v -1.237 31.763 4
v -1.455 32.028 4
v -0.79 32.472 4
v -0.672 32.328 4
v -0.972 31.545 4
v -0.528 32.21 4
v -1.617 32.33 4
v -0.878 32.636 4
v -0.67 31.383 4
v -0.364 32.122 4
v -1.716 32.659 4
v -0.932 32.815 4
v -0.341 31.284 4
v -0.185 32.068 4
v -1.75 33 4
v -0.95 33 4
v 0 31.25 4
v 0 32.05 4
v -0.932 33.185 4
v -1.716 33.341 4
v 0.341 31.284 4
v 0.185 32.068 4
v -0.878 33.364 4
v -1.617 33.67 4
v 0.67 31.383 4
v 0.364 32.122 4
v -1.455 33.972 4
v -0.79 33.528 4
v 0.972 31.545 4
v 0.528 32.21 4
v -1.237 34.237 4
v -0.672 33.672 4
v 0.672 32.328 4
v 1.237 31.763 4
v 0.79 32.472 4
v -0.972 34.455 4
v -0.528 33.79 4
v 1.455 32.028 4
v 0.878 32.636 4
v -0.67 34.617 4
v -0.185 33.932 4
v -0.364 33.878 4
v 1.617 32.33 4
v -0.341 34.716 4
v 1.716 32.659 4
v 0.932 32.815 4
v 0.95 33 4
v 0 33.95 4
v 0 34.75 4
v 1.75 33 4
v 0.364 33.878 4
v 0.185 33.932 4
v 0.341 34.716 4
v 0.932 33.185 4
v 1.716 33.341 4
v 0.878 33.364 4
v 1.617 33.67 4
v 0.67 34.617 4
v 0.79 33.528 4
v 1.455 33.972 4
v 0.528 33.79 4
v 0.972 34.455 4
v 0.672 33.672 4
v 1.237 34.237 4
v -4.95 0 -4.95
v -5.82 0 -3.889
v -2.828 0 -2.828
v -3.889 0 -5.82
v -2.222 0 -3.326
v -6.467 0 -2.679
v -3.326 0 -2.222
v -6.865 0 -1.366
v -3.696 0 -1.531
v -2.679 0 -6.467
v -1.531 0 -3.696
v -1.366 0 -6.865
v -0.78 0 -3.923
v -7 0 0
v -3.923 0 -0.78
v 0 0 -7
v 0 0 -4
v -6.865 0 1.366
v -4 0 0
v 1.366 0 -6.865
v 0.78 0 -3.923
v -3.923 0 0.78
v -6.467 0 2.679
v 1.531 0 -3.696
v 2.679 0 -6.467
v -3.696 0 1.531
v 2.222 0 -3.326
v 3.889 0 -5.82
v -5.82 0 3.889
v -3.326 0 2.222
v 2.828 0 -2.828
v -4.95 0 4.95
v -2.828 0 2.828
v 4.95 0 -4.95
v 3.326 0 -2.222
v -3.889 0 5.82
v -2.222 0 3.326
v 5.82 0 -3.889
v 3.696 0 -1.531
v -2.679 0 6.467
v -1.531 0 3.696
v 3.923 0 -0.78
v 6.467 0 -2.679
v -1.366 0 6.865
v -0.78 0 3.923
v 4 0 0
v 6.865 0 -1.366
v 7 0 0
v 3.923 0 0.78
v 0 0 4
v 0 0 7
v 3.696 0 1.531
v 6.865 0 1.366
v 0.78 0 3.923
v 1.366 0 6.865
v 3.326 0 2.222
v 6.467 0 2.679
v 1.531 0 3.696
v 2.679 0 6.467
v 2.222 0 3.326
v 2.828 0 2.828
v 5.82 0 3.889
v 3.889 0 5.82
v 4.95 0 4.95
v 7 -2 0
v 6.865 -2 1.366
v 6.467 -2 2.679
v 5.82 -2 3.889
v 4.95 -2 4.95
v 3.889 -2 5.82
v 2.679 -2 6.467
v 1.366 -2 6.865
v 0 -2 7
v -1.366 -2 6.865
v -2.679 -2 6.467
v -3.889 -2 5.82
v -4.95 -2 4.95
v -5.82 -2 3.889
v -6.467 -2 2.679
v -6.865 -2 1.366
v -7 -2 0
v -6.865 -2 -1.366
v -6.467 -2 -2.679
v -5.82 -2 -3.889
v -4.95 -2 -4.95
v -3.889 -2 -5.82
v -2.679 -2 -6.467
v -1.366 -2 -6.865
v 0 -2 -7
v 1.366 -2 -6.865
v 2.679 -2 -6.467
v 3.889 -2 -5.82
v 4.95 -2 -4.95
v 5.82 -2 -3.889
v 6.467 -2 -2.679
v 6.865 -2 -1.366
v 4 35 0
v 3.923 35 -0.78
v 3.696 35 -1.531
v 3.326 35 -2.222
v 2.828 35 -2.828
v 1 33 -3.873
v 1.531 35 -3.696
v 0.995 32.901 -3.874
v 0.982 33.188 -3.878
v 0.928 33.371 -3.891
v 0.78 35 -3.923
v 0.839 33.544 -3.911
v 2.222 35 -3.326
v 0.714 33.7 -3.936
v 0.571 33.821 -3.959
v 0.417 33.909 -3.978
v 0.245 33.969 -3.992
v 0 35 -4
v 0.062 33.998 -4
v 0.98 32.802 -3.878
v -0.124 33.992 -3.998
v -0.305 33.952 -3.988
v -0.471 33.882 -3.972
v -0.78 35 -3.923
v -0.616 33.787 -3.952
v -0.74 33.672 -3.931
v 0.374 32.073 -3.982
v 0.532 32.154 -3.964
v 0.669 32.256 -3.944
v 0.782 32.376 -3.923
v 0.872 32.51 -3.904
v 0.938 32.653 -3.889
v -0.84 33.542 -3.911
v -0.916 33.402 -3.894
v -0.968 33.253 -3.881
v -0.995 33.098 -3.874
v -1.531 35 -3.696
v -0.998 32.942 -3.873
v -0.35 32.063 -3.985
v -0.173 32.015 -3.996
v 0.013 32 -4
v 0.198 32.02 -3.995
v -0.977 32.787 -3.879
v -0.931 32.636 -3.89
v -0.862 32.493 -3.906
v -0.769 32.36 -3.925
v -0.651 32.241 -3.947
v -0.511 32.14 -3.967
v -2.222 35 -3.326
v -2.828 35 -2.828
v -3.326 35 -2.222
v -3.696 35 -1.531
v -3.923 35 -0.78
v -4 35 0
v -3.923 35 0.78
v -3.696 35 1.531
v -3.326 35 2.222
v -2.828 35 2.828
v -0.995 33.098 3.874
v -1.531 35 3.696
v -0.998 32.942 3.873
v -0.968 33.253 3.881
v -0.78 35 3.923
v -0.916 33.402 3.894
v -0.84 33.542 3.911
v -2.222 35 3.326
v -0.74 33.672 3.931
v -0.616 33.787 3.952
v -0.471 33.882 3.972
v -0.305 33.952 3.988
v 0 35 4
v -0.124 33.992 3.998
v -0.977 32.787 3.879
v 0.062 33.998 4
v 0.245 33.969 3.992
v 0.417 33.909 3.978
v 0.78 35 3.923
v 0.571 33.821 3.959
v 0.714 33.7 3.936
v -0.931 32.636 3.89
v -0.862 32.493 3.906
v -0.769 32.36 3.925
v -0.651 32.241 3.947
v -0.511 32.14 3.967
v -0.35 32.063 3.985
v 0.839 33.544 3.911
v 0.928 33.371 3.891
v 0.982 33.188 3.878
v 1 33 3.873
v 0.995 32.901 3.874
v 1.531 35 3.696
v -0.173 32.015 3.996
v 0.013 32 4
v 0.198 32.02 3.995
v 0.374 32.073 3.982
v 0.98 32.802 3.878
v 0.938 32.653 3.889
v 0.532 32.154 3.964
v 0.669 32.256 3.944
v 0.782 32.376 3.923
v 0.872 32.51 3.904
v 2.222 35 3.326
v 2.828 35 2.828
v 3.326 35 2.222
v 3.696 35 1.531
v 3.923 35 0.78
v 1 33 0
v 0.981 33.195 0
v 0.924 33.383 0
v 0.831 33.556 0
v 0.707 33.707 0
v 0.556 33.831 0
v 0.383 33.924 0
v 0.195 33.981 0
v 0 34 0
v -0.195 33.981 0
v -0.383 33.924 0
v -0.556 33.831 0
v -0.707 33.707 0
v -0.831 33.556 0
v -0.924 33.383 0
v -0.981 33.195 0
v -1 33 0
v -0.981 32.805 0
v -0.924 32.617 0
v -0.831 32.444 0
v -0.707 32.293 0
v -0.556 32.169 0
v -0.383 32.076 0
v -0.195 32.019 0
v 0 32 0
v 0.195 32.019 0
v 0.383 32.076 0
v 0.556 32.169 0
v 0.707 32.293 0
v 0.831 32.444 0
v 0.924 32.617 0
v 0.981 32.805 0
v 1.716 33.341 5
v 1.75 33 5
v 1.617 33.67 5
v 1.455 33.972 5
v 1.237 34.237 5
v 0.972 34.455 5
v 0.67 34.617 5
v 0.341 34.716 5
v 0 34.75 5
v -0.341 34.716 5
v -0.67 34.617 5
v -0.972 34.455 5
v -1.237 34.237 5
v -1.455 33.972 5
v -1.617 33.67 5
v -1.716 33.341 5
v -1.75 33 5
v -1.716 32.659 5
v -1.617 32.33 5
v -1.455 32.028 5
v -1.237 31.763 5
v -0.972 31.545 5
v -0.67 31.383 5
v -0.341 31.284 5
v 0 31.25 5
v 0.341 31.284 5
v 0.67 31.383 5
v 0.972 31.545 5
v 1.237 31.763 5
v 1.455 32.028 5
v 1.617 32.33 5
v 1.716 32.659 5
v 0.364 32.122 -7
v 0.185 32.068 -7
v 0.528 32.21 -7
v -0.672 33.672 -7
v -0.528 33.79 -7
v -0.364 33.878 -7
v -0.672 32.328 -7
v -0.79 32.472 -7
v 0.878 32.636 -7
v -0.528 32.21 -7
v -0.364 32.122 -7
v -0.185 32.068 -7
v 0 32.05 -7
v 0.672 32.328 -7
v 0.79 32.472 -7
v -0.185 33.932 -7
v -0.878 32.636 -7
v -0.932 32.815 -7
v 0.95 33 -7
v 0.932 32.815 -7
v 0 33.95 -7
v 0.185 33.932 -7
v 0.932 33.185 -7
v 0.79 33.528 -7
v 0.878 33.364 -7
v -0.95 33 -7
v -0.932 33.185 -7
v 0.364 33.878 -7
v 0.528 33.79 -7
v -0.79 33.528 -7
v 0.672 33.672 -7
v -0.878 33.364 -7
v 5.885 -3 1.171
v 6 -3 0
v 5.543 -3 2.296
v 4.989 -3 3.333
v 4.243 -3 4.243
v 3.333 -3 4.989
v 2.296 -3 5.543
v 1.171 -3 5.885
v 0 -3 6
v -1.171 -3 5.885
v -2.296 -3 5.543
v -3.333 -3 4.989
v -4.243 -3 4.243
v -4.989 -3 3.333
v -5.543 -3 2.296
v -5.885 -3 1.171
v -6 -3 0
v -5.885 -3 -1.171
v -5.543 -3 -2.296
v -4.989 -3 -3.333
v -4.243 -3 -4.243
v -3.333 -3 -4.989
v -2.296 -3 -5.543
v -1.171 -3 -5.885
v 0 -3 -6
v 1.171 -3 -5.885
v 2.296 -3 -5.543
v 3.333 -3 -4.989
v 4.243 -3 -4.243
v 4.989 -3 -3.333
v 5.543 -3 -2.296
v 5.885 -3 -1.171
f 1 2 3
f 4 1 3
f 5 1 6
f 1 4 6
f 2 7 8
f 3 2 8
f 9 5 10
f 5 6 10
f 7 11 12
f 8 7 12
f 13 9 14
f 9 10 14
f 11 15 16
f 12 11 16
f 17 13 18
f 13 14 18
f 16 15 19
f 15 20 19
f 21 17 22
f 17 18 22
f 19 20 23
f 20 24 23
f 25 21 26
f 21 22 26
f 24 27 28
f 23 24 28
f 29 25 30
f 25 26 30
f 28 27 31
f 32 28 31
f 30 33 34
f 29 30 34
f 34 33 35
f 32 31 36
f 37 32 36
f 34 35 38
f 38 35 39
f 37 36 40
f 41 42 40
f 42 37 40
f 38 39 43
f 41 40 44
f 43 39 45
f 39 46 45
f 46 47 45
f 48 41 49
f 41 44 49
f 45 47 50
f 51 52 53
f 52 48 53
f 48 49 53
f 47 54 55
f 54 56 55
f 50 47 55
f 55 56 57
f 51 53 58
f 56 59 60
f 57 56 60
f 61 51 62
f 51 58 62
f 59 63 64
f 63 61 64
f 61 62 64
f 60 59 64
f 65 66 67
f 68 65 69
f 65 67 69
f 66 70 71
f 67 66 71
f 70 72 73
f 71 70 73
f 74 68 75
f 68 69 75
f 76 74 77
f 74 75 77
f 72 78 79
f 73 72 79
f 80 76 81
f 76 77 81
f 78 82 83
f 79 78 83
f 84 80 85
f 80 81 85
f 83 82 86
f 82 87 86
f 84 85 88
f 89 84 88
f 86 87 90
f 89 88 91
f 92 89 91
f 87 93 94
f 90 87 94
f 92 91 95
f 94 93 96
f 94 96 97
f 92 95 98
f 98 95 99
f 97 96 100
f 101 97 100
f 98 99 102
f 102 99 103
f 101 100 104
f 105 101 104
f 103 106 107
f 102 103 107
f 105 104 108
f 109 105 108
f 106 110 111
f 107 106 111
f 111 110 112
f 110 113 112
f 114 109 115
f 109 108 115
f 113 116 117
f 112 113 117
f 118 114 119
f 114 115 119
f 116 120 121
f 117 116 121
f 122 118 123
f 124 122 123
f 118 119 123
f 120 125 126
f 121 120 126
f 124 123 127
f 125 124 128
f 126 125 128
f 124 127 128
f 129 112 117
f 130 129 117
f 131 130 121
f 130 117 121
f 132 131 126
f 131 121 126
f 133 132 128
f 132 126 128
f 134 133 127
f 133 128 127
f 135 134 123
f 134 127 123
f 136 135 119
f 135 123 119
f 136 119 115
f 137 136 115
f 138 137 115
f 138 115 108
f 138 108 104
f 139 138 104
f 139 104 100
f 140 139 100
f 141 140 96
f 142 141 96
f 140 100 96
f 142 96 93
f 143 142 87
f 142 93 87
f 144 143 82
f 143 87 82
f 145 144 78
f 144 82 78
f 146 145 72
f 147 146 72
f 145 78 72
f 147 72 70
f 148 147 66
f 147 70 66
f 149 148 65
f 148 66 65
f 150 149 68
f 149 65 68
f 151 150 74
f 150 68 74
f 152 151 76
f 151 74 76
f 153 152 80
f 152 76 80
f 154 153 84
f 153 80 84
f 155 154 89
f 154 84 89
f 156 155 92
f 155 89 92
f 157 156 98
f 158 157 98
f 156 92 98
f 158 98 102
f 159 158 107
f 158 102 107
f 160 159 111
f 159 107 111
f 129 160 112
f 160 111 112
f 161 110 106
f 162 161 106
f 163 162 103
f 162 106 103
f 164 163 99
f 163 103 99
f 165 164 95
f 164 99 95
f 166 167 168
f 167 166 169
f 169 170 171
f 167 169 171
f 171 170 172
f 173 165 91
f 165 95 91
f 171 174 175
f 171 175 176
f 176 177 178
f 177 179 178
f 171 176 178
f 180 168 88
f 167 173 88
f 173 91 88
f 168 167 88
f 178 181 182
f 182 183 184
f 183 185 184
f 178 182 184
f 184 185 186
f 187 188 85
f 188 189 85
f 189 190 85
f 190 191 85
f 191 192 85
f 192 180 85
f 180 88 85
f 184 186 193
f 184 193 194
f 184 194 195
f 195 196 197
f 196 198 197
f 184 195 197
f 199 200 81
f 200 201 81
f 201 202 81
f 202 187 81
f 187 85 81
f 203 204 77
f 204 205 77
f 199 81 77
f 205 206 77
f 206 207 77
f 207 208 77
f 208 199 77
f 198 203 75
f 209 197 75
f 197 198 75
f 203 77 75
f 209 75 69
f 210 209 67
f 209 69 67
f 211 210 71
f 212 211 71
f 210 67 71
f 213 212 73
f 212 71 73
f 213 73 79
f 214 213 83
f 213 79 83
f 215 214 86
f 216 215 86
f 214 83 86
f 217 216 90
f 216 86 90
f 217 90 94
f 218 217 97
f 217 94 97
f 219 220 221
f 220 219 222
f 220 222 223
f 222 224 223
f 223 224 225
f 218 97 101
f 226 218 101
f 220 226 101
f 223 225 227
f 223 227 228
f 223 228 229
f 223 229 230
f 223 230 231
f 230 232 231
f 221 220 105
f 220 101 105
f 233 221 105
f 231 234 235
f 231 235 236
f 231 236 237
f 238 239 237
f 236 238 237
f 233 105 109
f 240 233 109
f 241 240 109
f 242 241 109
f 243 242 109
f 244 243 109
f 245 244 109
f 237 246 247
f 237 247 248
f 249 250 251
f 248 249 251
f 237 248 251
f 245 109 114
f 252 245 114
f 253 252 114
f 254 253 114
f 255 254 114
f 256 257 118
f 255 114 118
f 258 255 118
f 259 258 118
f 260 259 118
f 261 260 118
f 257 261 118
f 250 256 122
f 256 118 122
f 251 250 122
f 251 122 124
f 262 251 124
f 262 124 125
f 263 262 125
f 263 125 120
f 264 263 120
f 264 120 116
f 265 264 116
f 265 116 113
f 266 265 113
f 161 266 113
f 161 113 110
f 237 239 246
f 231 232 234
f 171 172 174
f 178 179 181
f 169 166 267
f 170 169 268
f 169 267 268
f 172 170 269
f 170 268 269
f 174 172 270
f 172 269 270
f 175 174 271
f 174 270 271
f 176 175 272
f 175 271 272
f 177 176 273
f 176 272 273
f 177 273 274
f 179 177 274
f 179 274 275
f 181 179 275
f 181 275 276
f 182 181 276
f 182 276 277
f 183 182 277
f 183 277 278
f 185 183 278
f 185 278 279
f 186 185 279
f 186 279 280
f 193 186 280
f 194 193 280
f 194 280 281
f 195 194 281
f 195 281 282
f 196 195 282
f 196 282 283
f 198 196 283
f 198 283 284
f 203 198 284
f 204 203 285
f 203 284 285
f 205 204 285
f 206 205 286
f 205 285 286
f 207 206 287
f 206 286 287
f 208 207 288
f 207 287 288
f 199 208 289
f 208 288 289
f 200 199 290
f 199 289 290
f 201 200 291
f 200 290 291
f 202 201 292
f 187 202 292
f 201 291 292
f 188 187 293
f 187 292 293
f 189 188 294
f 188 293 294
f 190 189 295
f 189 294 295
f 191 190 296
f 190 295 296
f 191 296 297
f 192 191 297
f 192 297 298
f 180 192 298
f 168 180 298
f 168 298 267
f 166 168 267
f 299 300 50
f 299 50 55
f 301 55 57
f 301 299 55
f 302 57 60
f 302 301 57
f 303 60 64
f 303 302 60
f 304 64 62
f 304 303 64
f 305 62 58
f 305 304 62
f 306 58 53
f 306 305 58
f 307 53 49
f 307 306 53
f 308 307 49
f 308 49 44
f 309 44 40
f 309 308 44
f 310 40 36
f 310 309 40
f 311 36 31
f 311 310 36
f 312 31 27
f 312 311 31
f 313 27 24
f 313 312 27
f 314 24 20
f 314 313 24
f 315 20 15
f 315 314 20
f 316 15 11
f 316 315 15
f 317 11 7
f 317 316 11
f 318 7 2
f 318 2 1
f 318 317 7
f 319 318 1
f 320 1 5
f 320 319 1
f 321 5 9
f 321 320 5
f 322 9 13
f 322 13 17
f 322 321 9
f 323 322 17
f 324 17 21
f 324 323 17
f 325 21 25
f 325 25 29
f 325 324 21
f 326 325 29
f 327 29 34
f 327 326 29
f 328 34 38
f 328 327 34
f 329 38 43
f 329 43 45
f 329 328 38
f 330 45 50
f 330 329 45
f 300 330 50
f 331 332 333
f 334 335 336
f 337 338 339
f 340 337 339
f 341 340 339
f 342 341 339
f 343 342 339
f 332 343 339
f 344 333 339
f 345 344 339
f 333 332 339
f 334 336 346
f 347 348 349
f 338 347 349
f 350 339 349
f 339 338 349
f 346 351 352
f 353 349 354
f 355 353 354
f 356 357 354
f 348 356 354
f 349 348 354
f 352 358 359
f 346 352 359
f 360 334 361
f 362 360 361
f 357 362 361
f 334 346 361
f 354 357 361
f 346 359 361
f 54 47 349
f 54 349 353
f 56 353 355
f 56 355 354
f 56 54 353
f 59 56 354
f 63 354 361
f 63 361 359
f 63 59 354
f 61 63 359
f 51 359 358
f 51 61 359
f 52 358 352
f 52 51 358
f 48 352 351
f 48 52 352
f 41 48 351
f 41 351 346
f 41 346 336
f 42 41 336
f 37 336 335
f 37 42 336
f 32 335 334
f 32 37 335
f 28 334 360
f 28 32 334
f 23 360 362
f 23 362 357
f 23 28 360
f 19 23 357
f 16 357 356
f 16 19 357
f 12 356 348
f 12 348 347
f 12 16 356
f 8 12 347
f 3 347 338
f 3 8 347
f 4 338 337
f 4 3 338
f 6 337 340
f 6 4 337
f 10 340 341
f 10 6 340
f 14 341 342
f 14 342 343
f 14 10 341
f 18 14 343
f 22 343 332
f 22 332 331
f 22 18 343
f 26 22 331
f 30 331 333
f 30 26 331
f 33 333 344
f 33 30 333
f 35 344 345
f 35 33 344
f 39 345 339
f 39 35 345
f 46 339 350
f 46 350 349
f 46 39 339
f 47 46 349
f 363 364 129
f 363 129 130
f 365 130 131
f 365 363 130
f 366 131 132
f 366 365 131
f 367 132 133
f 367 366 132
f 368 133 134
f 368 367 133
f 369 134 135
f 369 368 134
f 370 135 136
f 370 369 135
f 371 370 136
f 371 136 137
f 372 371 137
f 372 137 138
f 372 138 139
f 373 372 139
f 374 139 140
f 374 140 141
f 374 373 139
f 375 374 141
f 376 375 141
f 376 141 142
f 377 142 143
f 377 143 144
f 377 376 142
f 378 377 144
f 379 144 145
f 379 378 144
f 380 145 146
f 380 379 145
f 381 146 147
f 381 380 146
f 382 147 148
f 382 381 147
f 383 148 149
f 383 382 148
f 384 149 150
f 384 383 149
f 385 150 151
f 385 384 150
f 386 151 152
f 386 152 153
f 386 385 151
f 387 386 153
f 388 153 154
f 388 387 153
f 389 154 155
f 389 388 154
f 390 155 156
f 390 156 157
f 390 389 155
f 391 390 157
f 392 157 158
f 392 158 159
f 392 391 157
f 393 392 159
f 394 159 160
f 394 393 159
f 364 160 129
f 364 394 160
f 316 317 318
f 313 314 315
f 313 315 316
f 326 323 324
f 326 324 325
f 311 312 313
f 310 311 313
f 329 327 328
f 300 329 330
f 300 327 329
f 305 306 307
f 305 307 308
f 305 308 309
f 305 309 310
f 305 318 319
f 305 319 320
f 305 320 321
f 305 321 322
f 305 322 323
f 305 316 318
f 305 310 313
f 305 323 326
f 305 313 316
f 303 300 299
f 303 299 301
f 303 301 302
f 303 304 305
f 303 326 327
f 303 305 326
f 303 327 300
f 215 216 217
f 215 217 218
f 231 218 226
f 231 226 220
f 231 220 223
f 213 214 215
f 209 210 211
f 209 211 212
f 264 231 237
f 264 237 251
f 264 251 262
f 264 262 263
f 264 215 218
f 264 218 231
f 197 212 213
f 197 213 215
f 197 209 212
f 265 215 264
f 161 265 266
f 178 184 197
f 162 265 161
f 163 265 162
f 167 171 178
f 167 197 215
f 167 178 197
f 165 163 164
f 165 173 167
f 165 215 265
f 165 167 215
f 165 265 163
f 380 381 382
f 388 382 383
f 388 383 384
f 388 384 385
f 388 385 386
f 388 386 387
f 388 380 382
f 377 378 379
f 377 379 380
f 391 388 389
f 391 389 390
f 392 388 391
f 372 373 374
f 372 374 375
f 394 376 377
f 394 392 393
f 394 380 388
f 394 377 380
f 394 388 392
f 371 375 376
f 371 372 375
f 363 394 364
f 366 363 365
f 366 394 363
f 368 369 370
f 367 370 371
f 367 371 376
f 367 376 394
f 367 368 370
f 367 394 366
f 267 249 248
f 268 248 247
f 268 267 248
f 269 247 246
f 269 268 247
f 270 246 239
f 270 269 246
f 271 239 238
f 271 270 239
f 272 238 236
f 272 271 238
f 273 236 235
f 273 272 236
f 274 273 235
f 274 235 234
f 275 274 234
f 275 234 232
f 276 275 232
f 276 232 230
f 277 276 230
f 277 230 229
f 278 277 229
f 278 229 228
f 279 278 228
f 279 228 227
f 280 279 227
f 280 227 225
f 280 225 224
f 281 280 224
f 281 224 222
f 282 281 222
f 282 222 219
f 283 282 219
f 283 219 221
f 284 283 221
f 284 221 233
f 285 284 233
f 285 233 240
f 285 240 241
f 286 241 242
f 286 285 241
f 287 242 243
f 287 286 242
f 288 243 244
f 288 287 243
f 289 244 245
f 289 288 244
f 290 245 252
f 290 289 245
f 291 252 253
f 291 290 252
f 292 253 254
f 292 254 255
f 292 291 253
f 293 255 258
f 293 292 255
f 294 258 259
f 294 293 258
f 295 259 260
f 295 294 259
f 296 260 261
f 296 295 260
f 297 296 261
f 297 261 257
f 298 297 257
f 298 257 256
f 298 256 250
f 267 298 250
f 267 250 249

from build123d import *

# Parameters (mm, degrees)
SKETCH1_R                = 4
BOSS_EXTRUDE1_DEPTH      = 35
SKETCH2_R                = 7
BOSS_EXTRUDE2_DEPTH      = 3
CHAMFER1_SIZE            = 1
SKETCH3_R                = 1
CUT_EXTRUDE1_DEPTH       = 10
CUT_EXTRUDE1_DEPTH_BACK  = 10
SKETCH4_R                = 0.95
BOSS_EXTRUDE3_DEPTH      = 5
BOSS_EXTRUDE3_DEPTH_BACK = 7
SKETCH5_R                = 1.75
BOSS_EXTRUDE4_DEPTH      = 1


with BuildPart() as part:
    # Sketch1 → Boss-Extrude1 (new body)
    with BuildSketch(Plane(origin=(0, 0, 0), x_dir=(1, 0, 0), z_dir=(0, 1, 0))):
        Circle(SKETCH1_R)
    extrude(amount=BOSS_EXTRUDE1_DEPTH)

    # Sketch2 → Boss-Extrude2 (add)
    with BuildSketch(Plane.XZ):
        Circle(SKETCH2_R)
    extrude(amount=BOSS_EXTRUDE2_DEPTH)

    # Chamfer1
    chamfer1_edges = [part.edges().sort_by_distance(p)[0] for p in [
        (-7, -3, 0),
    ]]
    chamfer(chamfer1_edges, length=CHAMFER1_SIZE)

    # Sketch3 → Cut-Extrude1 (cut, two sides)
    with BuildSketch(Plane.XY) as cut_extrude1_sk:
        with Locations((0, 33)):
            Circle(SKETCH3_R)
    extrude(amount=CUT_EXTRUDE1_DEPTH, mode=Mode.SUBTRACT)
    extrude(cut_extrude1_sk.sketch, amount=-CUT_EXTRUDE1_DEPTH_BACK, mode=Mode.SUBTRACT)


with BuildPart() as body_2:
    # Sketch4 → Boss-Extrude3 (new body, two sides)
    with BuildSketch(Plane.XY) as boss_extrude3_sk:
        with Locations((0, 33)):
            Circle(SKETCH4_R)
    extrude(amount=BOSS_EXTRUDE3_DEPTH)
    extrude(boss_extrude3_sk.sketch, amount=-BOSS_EXTRUDE3_DEPTH_BACK)

    # Sketch5 → Boss-Extrude4 (add)
    with BuildSketch(Plane.XY.offset(5)):
        with Locations((0, 33)):
            Circle(SKETCH5_R)
    extrude(amount=-BOSS_EXTRUDE4_DEPTH)


solid = Compound([part.part, body_2.part])
